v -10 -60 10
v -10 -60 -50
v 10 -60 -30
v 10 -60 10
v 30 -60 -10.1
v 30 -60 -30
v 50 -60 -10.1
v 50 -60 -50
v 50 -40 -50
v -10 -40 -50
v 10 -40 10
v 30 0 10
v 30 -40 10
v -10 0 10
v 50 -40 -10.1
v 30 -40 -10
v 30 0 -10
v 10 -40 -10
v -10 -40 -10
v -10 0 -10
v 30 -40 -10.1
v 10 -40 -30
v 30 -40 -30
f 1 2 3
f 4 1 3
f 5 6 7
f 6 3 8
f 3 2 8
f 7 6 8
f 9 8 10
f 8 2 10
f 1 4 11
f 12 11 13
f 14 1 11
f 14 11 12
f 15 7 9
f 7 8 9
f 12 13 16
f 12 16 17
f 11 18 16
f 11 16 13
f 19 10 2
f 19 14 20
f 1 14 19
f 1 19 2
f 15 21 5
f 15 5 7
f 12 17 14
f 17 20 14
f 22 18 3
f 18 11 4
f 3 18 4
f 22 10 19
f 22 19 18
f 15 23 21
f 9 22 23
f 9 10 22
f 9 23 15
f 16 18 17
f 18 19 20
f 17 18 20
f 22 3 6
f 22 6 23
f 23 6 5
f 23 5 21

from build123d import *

# Parameters (mm, degrees)
F0_W     = 20
F0_H     = 20
F1_DEPTH = 60
F2_W     = 40
F2_H     = 20
F3_DEPTH = 20
F4_W     = 20
F4_H     = 20
F5_DEPTH = 40
F6_W     = 20
F6_H     = 20
F7_DEPTH = 40
F8_W     = 20
F8_H     = 20
F9_DEPTH = 19.9


with BuildPart() as f1:
    # F0 (on Front) → F1 (new body)
    with BuildSketch(Plane.XZ):
        Rectangle(F0_W, F0_H)
    extrude(amount=F1_DEPTH)

    # F2 (on face) → F3 (join)
    with BuildSketch(Plane.YZ.offset(10)):
        with Locations((-20, 0)):
            Rectangle(F2_W, F2_H)
    extrude(amount=F3_DEPTH)

    # F4 (on face) → F5 (join)
    with BuildSketch(Plane(origin=(0, 0, -10), x_dir=(1, 0, 0), z_dir=(0, 0, -1))):
        with Locations((0, 50)):
            Rectangle(F4_W, F4_H)
    extrude(amount=F5_DEPTH)

    # F6 (on face) → F7 (join)
    with BuildSketch(Plane.YZ.offset(10)):
        with Locations((-50, -40)):
            Rectangle(F6_W, F6_H)
    extrude(amount=F7_DEPTH)

    # F8 (on face) → F9 (join)
    with BuildSketch(Plane.XY.offset(-30)):
        with Locations((40, -50)):
            Rectangle(F8_W, F8_H)
    extrude(amount=F9_DEPTH)


solid = f1.part
